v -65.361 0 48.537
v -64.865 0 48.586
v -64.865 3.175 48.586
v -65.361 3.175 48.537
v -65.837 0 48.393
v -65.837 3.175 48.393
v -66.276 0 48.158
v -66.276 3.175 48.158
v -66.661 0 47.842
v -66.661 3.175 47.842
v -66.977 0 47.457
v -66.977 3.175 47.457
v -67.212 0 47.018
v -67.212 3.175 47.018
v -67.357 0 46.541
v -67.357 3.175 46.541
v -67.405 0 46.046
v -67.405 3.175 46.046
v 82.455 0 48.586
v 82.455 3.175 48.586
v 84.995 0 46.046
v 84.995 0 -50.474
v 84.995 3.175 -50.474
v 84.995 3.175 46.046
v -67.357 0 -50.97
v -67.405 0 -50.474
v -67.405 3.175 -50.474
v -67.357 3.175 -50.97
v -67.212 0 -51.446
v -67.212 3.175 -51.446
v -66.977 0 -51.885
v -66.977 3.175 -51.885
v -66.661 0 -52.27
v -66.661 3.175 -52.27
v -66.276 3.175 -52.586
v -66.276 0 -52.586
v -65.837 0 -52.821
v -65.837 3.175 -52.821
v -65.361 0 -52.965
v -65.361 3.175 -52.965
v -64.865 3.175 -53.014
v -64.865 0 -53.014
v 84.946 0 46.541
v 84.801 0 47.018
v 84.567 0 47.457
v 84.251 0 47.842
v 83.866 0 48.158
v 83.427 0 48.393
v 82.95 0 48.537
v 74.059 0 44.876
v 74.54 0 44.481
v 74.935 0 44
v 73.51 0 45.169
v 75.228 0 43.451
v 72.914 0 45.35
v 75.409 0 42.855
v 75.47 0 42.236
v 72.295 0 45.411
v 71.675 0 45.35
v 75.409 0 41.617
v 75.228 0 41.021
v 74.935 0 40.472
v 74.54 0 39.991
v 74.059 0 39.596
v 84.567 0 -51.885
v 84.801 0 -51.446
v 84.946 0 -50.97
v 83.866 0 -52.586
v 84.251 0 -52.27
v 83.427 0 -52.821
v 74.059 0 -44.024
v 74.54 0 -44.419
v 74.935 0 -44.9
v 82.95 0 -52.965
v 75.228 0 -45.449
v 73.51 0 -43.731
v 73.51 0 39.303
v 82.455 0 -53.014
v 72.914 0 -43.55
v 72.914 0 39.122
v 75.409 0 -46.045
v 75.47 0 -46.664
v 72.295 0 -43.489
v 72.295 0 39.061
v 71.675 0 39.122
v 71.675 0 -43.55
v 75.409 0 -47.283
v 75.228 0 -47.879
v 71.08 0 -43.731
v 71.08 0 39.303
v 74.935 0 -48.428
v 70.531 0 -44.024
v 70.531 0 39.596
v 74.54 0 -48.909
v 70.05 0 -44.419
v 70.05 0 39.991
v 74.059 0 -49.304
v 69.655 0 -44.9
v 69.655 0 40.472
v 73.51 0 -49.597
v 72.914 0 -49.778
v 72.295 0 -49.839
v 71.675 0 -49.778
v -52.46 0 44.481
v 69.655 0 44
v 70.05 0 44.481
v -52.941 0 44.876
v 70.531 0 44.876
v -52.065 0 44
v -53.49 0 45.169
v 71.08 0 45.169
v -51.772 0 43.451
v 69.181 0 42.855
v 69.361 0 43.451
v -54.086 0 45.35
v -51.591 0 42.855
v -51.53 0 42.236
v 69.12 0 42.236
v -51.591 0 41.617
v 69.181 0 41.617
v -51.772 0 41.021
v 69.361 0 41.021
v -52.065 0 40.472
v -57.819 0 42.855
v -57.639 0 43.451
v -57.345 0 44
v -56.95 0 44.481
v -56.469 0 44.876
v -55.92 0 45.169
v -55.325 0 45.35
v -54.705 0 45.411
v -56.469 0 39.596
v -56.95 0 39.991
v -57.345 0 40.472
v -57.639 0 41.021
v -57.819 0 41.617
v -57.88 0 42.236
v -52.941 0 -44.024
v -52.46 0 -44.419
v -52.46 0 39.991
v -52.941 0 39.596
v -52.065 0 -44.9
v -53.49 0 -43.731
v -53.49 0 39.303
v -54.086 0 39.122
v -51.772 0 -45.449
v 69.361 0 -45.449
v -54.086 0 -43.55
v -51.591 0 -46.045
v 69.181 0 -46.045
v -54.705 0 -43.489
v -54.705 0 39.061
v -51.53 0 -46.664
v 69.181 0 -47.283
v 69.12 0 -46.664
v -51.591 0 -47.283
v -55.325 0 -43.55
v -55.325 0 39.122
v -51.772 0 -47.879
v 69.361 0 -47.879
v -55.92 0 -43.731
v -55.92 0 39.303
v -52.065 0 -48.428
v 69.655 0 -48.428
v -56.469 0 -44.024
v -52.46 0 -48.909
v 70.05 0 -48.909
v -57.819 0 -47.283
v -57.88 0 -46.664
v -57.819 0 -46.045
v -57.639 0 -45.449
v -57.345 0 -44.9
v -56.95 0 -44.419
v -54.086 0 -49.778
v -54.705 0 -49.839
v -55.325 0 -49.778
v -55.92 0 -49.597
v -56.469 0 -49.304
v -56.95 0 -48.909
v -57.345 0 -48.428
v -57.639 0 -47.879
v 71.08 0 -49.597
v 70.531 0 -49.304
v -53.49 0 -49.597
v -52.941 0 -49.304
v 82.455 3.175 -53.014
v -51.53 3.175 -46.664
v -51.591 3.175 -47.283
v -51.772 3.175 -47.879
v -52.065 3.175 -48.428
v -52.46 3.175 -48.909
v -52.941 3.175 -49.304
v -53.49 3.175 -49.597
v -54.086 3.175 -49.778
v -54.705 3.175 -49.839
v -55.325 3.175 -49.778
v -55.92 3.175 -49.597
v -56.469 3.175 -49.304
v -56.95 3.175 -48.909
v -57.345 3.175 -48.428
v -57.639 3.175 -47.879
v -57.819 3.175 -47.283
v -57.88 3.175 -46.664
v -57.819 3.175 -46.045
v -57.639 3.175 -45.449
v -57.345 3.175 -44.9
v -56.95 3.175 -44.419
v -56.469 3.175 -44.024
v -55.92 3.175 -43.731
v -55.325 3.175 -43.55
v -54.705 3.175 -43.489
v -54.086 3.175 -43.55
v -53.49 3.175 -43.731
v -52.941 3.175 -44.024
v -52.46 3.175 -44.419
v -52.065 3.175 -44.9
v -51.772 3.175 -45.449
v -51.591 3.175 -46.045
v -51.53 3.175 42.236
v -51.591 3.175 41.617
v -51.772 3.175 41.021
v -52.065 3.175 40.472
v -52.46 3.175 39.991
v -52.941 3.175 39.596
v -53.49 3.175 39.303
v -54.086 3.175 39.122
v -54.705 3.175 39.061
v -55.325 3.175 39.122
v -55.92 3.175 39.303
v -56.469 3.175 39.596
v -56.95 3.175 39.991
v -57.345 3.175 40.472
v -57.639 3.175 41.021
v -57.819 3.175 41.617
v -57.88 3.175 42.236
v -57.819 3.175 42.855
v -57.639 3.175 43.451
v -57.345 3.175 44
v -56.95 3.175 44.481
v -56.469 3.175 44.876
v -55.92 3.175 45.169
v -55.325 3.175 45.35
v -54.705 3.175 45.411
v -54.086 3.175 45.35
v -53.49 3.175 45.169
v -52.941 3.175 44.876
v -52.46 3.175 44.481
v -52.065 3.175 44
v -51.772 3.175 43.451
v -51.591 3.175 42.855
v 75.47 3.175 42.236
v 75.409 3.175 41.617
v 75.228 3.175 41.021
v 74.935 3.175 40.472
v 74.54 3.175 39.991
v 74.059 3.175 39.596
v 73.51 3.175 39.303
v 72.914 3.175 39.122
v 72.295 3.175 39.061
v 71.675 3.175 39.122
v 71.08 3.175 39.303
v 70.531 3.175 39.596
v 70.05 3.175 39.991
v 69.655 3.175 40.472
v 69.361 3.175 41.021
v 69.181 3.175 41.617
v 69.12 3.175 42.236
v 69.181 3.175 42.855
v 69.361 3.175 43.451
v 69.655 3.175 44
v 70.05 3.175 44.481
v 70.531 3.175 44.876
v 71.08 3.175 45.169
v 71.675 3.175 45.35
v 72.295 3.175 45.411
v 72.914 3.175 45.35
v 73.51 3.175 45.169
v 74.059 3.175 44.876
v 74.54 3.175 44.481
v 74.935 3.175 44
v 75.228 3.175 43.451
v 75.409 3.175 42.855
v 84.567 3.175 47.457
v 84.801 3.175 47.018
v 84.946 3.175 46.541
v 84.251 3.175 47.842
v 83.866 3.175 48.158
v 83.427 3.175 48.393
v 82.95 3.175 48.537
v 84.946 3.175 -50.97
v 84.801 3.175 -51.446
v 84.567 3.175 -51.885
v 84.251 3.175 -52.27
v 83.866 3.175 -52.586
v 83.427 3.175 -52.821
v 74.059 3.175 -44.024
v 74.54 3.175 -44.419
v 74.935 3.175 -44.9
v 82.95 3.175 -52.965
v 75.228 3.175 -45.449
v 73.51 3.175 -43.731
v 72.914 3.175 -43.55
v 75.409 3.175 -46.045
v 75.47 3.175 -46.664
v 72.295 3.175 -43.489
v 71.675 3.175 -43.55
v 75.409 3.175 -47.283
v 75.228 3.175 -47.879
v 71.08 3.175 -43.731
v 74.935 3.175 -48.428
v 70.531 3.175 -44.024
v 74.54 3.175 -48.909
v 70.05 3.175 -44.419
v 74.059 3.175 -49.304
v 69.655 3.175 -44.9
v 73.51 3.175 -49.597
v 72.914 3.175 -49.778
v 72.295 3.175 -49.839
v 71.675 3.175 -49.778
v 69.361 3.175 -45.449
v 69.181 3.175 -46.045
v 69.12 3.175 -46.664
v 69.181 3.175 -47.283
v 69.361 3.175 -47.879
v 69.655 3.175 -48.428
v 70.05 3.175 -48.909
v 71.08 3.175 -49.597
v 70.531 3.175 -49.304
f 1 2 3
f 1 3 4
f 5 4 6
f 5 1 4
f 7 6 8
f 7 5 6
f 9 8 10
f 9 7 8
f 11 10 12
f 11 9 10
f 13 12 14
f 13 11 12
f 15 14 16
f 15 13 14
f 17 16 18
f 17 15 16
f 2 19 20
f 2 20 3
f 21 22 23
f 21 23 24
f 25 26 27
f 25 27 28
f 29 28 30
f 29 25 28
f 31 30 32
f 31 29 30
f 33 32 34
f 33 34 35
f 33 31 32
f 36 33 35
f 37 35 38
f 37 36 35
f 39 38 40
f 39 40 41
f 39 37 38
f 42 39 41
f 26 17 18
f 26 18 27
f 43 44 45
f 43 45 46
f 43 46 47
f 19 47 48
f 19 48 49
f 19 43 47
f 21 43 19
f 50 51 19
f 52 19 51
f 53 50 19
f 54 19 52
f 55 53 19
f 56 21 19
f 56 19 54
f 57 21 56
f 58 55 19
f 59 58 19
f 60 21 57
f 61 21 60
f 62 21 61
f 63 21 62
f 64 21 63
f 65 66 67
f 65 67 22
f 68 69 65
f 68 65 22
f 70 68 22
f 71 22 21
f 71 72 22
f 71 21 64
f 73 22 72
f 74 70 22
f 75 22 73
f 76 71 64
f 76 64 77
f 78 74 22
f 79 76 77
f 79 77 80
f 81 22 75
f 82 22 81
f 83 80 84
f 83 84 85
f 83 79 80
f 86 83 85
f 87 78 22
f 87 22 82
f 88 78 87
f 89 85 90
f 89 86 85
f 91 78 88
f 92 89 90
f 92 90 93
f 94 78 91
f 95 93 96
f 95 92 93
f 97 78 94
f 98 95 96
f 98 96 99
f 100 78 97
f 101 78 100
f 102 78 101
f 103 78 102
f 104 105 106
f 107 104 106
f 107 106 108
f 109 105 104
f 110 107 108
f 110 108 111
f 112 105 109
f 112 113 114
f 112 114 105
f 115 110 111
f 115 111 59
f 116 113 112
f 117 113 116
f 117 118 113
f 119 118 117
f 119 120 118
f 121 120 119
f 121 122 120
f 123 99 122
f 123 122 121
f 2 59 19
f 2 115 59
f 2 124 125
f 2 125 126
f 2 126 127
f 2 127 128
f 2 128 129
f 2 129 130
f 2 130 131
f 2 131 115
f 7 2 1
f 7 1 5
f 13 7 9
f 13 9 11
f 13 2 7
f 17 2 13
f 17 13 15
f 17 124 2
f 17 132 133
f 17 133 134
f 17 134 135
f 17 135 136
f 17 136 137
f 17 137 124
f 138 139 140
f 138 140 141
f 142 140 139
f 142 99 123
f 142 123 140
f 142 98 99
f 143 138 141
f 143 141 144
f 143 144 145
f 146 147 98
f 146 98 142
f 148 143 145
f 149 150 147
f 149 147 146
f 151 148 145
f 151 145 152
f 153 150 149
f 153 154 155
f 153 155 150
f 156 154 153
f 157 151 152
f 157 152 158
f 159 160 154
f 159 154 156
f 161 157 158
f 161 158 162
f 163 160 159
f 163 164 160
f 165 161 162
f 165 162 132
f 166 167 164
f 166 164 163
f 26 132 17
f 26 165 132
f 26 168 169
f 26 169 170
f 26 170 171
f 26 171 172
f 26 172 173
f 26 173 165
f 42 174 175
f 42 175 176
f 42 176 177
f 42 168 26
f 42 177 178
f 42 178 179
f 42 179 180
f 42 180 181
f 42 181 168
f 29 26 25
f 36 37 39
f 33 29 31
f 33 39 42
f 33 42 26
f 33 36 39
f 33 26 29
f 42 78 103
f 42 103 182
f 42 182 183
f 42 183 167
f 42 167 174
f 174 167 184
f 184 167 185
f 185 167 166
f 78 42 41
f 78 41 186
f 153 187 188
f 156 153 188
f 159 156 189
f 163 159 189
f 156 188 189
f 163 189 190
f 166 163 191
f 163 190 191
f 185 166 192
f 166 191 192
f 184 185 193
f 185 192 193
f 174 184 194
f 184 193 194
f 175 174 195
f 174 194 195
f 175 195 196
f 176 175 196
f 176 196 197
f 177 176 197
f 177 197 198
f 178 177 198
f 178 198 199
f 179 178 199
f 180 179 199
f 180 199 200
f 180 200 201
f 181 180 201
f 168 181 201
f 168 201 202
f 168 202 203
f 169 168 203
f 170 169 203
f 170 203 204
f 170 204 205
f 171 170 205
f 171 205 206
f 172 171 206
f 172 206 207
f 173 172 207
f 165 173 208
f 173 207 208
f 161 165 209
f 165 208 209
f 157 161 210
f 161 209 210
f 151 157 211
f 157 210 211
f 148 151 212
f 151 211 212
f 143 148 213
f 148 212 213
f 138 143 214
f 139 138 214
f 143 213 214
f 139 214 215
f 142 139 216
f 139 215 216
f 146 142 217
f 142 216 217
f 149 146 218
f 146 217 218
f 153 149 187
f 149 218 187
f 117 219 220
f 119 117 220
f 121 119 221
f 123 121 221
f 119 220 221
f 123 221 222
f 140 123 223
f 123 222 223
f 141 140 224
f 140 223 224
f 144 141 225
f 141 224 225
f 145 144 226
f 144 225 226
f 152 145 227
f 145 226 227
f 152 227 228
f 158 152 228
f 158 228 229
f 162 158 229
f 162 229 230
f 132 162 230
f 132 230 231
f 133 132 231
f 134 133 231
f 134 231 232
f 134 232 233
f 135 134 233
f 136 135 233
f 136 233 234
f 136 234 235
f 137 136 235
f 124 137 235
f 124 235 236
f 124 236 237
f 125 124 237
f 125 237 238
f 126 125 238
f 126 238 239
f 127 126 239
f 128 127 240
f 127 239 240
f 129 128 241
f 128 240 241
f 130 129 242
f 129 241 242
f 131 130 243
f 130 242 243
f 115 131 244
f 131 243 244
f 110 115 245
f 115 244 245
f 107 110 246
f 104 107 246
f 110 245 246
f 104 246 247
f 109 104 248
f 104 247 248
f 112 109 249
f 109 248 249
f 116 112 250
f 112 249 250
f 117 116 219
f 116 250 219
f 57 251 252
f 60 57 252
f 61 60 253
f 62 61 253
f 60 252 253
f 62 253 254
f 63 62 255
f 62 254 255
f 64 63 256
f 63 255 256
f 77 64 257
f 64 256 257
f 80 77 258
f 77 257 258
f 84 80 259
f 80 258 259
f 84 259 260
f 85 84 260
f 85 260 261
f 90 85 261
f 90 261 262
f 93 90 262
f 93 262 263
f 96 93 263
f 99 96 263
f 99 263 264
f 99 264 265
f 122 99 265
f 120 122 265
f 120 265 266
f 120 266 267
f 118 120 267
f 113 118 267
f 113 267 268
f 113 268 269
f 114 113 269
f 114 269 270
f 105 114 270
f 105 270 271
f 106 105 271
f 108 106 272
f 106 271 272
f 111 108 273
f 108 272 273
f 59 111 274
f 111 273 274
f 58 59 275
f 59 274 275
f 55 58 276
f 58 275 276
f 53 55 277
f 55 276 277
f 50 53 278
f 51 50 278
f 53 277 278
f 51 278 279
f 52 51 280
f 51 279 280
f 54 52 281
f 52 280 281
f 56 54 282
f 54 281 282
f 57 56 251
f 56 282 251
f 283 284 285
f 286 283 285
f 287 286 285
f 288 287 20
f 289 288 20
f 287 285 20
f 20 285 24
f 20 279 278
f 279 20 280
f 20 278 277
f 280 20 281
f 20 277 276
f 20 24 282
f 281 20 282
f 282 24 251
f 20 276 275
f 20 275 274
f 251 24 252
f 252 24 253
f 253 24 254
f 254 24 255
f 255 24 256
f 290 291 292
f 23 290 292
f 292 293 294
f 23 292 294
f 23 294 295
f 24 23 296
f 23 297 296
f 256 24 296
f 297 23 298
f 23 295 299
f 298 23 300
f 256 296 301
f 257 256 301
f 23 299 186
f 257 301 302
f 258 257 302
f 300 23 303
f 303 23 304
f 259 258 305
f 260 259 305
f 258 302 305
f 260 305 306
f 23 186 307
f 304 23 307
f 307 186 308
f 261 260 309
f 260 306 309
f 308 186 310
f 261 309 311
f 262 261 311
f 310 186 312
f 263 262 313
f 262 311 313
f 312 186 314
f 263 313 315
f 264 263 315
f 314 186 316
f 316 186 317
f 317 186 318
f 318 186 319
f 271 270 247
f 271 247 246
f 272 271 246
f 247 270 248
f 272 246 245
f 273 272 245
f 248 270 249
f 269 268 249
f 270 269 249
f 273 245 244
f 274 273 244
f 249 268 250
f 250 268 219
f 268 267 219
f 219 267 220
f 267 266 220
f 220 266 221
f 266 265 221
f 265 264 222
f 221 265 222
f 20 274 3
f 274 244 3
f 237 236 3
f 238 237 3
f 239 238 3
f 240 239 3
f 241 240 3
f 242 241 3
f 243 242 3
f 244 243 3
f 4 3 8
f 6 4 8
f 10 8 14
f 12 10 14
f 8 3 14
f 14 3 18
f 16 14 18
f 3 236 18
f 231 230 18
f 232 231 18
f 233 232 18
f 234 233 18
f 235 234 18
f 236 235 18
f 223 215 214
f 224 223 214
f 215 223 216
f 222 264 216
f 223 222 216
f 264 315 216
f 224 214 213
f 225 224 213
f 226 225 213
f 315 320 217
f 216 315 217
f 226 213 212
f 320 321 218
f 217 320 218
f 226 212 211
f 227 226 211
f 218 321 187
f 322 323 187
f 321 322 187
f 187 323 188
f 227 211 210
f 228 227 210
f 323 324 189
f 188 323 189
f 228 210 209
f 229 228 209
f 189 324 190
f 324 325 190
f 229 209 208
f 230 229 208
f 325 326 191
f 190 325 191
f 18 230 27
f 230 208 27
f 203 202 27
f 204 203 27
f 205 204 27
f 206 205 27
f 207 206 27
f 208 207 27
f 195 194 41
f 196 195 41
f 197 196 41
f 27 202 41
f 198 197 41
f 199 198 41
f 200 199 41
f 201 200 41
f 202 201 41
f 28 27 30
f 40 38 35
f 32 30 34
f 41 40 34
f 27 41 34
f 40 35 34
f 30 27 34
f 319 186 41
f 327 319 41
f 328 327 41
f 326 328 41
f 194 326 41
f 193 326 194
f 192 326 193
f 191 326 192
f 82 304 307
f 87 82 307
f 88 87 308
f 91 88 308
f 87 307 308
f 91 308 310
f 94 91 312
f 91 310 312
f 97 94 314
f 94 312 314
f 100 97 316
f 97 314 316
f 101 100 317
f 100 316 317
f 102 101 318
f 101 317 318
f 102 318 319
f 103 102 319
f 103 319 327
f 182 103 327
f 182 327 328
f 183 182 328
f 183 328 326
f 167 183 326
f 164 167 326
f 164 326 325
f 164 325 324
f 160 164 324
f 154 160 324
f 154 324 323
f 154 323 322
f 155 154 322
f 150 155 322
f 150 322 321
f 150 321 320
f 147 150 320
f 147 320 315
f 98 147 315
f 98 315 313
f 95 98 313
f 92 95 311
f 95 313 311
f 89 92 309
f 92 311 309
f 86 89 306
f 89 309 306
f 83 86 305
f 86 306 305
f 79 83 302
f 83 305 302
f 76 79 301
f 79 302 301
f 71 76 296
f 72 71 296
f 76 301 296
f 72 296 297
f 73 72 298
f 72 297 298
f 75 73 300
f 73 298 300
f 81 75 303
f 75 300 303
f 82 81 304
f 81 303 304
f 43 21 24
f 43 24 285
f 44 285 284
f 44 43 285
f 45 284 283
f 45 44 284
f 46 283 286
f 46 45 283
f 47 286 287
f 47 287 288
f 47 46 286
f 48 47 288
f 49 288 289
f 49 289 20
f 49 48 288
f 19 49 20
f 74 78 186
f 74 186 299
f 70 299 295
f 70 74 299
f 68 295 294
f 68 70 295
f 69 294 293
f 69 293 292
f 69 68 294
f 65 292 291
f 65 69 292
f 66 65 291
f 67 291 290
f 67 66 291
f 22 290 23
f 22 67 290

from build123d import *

# Parameters (mm, degrees)
BOSS_EXTRUDE1_DEPTH            = 3.175
HOLE_FOR_10_300_SC_NUTS_SP_1_D = 6.35


with BuildPart() as part:
    # Sketch1 → Boss-Extrude1 (new body)
    with BuildSketch(Plane(origin=(0, 0, 0), x_dir=(1, 0, 0), z_dir=(0, 1, 0))):
        with BuildLine():
            Line((-64.865326877, 53.014043584), (82.454673123, 53.014043584))
            ThreePointArc((82.454673123, 53.014043584), (84.250724348, 52.270094808), (84.994673123, 50.474043584))
            Line((84.994673123, 50.474043584), (84.994673123, -46.045956416))
            ThreePointArc((84.994673123, -46.045956416), (84.250724348, -47.842007641), (82.454673123, -48.585956416))
            Line((82.454673123, -48.585956416), (-64.865326877, -48.585956416))
            ThreePointArc((-64.865326877, -48.585956416), (-66.661378101, -47.842007641), (-67.405326877, -46.045956416))
            Line((-67.405326877, -46.045956416), (-67.405326877, 50.474043584))
            ThreePointArc((-67.405326877, 50.474043584), (-66.661378101, 52.270094808), (-64.865326877, 53.014043584))
        make_face()
    extrude(amount=BOSS_EXTRUDE1_DEPTH)

    # Hole for #10 300® SC Nuts (SP)1 (through all)
    with Locations(Plane(origin=(0, 0, 0), x_dir=(-1, 0, 0), z_dir=(0, -1, 0))):
        with Locations((-72.294673123, 46.664043584), (-72.294673123, -42.235956416), (54.705326877, -42.235956416), (54.705326877, 46.664043584)):
            Hole(HOLE_FOR_10_300_SC_NUTS_SP_1_D / 2)


solid = part.part
